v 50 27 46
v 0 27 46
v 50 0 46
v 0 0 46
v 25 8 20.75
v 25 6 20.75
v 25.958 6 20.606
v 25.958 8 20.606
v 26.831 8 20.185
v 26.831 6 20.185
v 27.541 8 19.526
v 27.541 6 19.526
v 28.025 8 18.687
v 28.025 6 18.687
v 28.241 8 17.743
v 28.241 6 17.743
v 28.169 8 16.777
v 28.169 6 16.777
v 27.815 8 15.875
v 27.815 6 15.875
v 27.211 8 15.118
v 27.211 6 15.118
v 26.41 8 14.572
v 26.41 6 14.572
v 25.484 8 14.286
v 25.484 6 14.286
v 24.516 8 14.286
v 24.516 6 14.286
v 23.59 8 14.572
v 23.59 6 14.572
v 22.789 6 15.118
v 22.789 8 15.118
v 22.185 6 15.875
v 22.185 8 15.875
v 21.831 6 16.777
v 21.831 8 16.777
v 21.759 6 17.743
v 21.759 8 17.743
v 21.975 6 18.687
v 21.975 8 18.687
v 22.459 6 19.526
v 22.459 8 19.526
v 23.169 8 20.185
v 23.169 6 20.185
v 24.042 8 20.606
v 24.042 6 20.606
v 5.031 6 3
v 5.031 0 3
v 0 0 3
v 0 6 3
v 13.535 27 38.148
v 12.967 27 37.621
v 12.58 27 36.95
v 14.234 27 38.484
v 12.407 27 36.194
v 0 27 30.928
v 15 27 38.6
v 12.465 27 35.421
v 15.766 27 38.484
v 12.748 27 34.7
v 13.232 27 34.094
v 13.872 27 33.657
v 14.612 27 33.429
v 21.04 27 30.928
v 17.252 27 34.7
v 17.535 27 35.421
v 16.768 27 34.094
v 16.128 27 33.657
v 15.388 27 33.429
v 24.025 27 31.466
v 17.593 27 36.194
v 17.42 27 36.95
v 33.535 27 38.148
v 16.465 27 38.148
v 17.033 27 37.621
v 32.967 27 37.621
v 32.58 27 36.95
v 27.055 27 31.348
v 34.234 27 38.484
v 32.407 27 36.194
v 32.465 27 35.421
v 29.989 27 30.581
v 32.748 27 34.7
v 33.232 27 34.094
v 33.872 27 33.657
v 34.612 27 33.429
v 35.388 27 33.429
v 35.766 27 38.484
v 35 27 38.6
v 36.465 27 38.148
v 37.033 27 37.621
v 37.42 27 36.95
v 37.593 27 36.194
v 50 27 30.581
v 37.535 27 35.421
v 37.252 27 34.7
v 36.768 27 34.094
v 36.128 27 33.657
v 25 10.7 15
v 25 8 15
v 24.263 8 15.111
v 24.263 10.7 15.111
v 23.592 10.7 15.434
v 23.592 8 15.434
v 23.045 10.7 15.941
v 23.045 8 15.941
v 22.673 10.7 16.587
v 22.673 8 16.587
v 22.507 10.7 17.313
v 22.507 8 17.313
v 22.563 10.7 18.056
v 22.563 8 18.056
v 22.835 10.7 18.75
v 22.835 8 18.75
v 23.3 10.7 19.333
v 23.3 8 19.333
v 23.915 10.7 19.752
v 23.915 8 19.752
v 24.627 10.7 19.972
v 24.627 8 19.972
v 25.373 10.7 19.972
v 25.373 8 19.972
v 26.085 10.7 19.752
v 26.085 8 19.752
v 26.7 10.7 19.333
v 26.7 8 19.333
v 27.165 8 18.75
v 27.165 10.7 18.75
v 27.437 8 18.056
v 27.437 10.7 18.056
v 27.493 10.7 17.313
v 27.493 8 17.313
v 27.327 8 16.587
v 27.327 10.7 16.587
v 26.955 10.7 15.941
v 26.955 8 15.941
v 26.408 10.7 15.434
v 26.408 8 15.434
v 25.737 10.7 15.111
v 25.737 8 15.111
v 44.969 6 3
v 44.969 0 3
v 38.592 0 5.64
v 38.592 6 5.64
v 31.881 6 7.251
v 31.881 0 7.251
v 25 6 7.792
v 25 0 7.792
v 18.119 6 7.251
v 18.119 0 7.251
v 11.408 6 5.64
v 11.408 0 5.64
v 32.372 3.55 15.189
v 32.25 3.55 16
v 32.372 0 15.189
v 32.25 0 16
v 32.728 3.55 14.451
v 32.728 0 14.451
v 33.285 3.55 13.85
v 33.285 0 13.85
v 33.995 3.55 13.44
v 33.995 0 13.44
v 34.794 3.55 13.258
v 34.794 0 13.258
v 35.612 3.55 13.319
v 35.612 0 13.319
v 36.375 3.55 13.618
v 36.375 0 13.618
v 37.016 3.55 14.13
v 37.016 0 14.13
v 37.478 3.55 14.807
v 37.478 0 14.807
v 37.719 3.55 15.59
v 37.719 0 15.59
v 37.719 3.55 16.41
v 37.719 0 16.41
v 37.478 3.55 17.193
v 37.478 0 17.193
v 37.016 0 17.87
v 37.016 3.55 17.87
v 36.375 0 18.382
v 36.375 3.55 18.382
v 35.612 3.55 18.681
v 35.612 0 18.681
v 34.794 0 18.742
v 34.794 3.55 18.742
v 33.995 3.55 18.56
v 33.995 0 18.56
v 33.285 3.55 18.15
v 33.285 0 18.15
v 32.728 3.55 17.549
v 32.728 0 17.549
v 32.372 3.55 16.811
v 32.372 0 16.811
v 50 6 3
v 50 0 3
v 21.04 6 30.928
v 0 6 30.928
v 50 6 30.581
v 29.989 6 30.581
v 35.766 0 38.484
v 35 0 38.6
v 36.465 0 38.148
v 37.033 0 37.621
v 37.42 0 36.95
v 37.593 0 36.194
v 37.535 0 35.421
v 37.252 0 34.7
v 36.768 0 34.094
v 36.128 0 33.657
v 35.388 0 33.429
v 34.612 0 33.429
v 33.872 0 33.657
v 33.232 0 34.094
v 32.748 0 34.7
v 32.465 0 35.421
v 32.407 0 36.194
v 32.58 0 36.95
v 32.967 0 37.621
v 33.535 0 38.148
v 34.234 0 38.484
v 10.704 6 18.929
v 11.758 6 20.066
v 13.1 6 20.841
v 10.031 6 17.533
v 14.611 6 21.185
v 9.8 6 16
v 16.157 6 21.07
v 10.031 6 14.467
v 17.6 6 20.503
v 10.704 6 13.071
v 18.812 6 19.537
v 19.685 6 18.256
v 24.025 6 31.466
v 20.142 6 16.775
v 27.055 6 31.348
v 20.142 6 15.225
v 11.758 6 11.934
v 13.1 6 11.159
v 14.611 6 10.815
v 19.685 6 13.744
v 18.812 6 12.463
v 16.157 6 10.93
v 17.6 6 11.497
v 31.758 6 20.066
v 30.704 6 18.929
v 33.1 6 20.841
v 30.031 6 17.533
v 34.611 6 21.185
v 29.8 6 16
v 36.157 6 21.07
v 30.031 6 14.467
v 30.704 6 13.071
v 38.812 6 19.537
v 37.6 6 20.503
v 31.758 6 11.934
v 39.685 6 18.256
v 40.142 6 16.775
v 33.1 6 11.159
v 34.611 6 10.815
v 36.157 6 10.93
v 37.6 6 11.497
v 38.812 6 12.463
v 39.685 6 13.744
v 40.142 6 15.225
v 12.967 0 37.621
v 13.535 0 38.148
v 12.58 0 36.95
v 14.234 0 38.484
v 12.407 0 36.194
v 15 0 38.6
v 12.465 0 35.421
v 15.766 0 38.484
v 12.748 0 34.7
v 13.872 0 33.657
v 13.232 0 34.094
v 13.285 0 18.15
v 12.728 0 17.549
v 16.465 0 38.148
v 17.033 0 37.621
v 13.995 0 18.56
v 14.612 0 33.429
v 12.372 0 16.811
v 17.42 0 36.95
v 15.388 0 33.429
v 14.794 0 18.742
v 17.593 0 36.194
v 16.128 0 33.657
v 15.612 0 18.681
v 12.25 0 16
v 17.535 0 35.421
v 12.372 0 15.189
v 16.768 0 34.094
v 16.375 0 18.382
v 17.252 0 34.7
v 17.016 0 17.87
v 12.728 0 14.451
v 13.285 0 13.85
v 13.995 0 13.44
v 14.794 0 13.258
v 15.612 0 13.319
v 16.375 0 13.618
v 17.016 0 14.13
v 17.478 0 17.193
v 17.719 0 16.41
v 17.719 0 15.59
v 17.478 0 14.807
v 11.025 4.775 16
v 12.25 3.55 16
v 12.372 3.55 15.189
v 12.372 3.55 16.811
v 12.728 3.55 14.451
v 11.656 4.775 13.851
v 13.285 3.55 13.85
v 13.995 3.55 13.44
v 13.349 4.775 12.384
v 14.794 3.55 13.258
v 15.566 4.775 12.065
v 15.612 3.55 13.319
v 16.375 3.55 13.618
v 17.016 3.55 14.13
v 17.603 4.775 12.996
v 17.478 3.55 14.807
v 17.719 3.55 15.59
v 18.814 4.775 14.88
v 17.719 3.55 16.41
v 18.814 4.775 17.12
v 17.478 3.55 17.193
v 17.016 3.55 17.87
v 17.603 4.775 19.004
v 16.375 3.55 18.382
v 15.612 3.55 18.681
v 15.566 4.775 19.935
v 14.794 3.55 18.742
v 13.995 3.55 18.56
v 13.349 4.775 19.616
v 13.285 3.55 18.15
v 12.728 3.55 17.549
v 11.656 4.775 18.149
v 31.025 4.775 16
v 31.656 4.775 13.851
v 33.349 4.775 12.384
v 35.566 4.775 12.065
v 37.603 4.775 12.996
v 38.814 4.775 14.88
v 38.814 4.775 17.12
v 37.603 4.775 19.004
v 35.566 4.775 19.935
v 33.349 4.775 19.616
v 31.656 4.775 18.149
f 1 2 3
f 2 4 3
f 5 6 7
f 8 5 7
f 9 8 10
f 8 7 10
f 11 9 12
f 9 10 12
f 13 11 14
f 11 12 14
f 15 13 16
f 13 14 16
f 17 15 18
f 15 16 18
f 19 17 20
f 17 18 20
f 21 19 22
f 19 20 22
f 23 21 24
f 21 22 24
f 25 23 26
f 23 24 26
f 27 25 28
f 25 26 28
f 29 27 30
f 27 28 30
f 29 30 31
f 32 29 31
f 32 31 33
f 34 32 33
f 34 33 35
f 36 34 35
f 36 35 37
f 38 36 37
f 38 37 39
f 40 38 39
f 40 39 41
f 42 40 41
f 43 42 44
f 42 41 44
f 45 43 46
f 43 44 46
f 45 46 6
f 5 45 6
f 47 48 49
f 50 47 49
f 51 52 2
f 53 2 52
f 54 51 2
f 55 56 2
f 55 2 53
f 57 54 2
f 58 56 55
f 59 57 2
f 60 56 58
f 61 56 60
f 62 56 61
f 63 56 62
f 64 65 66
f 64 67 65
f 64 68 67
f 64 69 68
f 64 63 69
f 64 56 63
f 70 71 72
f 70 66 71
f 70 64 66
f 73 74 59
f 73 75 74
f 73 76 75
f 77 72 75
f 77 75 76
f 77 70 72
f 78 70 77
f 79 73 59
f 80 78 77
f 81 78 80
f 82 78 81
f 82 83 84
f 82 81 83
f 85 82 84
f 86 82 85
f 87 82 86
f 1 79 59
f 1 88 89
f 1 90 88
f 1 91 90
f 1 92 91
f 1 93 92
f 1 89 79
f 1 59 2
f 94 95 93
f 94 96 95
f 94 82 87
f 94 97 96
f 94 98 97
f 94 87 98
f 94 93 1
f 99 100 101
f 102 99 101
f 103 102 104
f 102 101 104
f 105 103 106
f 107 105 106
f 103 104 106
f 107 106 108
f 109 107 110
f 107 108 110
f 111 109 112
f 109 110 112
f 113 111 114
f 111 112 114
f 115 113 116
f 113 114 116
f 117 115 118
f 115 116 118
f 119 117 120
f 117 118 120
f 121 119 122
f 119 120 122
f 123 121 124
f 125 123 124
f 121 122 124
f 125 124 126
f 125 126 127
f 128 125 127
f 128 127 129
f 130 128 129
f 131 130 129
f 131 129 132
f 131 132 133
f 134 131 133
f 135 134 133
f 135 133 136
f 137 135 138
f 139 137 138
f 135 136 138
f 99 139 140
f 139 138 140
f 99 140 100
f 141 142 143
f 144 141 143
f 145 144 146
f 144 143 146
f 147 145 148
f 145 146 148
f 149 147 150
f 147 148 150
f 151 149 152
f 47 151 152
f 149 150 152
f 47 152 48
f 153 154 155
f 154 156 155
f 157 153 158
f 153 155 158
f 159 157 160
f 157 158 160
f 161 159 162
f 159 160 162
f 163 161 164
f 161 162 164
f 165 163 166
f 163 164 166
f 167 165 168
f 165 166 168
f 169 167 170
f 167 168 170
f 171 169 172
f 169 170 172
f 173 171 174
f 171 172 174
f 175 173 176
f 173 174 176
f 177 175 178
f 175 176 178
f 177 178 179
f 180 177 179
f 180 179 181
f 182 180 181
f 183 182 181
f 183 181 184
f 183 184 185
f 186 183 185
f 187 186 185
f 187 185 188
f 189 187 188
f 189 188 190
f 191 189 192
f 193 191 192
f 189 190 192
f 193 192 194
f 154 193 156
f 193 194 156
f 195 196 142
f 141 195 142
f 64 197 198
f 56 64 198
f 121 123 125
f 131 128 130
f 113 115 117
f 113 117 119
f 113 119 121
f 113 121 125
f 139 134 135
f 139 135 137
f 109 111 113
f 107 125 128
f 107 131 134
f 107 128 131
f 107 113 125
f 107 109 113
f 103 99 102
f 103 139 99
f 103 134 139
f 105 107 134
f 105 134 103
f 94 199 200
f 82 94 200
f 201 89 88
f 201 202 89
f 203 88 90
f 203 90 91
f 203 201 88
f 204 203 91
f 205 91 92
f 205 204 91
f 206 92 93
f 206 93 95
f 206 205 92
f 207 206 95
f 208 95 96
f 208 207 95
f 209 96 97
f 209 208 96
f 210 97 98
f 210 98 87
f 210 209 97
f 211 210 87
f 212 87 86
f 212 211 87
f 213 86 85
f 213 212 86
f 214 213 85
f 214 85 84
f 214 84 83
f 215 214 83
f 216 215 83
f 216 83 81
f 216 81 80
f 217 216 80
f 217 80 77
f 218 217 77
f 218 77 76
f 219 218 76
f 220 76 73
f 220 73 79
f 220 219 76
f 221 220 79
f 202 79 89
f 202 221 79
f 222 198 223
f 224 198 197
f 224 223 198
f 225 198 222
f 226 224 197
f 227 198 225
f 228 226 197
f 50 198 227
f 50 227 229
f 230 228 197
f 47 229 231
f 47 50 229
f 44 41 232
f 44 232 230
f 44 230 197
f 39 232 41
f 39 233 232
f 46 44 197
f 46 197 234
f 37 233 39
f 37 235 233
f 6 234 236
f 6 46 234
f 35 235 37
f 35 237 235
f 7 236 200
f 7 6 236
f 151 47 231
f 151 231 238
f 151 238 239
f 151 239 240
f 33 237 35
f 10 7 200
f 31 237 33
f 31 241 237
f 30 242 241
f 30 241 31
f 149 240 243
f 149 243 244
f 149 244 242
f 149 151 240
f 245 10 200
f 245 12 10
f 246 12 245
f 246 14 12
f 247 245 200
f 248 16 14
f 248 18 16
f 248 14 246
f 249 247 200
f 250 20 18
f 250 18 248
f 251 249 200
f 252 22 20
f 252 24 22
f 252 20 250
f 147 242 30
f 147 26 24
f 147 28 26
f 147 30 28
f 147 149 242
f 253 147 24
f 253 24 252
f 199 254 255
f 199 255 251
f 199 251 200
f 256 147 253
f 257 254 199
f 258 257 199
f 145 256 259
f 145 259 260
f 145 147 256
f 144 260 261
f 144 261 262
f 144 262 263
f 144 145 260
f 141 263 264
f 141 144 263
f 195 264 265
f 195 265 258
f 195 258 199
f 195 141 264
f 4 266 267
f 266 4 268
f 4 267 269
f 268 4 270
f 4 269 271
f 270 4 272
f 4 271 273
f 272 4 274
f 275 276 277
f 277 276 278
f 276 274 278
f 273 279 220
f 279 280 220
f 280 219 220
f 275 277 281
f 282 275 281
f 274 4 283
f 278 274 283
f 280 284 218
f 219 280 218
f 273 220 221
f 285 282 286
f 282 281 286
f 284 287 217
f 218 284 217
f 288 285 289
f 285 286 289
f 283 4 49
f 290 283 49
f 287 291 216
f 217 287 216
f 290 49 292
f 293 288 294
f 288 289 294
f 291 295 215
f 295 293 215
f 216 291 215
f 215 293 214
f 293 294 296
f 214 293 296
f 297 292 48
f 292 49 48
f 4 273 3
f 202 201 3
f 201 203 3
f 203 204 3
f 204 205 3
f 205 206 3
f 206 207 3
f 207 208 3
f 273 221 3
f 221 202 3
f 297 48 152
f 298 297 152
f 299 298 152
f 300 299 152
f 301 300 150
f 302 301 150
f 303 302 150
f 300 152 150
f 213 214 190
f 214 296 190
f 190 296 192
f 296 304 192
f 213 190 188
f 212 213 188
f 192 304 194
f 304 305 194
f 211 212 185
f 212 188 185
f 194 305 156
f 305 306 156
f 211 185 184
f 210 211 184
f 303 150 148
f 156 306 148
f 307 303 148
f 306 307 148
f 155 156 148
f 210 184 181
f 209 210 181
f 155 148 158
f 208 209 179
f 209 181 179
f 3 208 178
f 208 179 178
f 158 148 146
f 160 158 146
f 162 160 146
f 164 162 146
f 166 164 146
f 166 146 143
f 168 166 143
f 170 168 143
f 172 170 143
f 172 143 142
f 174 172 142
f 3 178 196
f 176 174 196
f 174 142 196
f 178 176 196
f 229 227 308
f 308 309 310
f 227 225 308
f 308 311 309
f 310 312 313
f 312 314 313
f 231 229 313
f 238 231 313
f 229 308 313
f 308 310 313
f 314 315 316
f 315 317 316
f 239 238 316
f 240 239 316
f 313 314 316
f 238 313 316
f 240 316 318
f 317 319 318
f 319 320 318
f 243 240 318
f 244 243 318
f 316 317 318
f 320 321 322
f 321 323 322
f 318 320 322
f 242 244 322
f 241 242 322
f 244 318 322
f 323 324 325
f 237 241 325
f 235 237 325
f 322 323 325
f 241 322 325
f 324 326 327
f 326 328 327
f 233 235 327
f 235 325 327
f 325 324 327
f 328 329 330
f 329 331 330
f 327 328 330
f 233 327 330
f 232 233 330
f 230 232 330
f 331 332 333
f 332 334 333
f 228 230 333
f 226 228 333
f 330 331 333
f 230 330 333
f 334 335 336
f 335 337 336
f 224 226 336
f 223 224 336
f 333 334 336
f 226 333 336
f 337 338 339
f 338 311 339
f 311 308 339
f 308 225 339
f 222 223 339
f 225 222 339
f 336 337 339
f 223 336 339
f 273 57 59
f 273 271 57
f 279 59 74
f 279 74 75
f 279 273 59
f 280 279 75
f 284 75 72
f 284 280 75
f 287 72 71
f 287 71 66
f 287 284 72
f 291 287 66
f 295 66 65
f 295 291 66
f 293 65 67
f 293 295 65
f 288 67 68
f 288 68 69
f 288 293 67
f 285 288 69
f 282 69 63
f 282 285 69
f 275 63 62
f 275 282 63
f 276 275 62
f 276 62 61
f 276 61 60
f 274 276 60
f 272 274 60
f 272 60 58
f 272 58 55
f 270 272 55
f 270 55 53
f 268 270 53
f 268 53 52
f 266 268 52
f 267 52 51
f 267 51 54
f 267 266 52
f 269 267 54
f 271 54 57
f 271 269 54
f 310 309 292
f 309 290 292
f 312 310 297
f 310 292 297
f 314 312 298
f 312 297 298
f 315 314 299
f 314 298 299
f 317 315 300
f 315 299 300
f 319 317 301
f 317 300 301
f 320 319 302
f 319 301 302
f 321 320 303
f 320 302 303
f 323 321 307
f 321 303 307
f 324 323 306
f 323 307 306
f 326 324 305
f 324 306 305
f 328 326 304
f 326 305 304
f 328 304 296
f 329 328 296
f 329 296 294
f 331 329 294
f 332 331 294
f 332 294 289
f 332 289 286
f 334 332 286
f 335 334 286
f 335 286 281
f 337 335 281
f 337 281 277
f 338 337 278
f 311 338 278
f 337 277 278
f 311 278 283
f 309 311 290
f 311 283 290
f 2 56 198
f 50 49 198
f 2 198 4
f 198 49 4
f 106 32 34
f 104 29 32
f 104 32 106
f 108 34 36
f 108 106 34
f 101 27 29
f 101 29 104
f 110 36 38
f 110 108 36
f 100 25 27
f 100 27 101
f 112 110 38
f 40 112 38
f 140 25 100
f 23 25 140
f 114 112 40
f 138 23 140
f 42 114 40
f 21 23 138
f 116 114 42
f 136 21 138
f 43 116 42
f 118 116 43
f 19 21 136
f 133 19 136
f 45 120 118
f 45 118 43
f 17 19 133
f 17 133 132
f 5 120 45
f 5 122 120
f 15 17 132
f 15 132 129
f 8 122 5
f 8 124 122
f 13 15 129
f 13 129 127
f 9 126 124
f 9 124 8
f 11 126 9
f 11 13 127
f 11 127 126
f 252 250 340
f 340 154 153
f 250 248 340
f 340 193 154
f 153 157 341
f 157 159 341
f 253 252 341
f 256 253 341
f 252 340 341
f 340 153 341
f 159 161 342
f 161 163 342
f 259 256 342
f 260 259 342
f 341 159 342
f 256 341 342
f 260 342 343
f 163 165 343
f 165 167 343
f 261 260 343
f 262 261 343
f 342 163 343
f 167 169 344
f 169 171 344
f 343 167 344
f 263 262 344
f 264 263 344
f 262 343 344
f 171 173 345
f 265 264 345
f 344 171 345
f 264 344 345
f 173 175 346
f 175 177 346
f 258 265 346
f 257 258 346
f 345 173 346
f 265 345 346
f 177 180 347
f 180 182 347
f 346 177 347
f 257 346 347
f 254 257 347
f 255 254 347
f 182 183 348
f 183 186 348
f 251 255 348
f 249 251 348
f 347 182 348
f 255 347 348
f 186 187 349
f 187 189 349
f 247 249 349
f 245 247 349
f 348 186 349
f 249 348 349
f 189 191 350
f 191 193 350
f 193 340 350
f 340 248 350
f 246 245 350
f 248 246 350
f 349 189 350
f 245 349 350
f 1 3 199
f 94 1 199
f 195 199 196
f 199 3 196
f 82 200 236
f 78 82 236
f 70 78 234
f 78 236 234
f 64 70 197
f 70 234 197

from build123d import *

# Parameters (mm, degrees)
SKETCH1_R                                       = 2.6
BOSS_EXTRUDE1_DEPTH                             = 6
SKETCH2_R                                       = 3.25
BOSS_EXTRUDE2_DEPTH                             = 2
SKETCH3_R                                       = 2.5
BOSS_EXTRUDE3_DEPTH                             = 2.7
CSK_FOR_M5_FLAT_HEAD_MACHINE_SCREW1_D           = 5.5
CSK_FOR_M5_FLAT_HEAD_MACHINE_SCREW1_CSINK_D     = 10.4
CSK_FOR_M5_FLAT_HEAD_MACHINE_SCREW1_CSINK_ANGLE = 90
SKETCH7_R                                       = 2.6
BOSS_EXTRUDE5_DEPTH                             = 21


with BuildPart() as part:
    # Sketch1 → Boss-Extrude1 (new body)
    with BuildSketch(Plane(origin=(0, 0, 0), x_dir=(1, 0, 0), z_dir=(0, 1, 0))):
        with BuildLine():
            Line((5.031184409, -3), (0, -3))
            Line((0, -3), (0, -46))
            Line((0, -46), (50, -46))
            Line((50, -46), (50, -3))
            Line((50, -3), (44.968815591, -3))
            ThreePointArc((44.968815591, -3), (25, -7.79226602), (5.031184409, -3))
        make_face()
        with Locations(Location((15, -36, 0), (0, 0, 270))):
            Circle(SKETCH1_R, mode=Mode.SUBTRACT)
        with Locations(Location((35, -36, 0), (0, 0, 270))):
            Circle(SKETCH1_R, mode=Mode.SUBTRACT)
        with Locations(Location((15, -16, 0), (0, 0, 270))):
            Circle(SKETCH1_R, mode=Mode.SUBTRACT)
        with Locations(Location((35, -16, 0), (0, 0, 270))):
            Circle(SKETCH1_R, mode=Mode.SUBTRACT)
    extrude(amount=BOSS_EXTRUDE1_DEPTH)

    # Sketch2 → Boss-Extrude2 (add)
    with BuildSketch(Plane(origin=(0, 6, 0), x_dir=(1, 0, 0), z_dir=(0, 1, 0))):
        with Locations(Location((25, -17.5, 0), (0, 0, 270))):
            Circle(SKETCH2_R)
    extrude(amount=BOSS_EXTRUDE2_DEPTH)

    # Sketch3 → Boss-Extrude3 (add)
    with BuildSketch(Plane(origin=(0, 8, 0), x_dir=(1, 0, 0), z_dir=(0, 1, 0))):
        with Locations(Location((25, -17.5, 0), (0, 0, 90))):
            Circle(SKETCH3_R)
    extrude(amount=BOSS_EXTRUDE3_DEPTH)

    # CSK for M5 Flat Head Machine Screw1 (through all)
    with Locations(Plane(origin=(0, 6, 0), x_dir=(1, 0, 0), z_dir=(0, 1, 0))):
        with Locations((15, -16), (35, -16)):
            CounterSinkHole(CSK_FOR_M5_FLAT_HEAD_MACHINE_SCREW1_D / 2, CSK_FOR_M5_FLAT_HEAD_MACHINE_SCREW1_CSINK_D / 2, counter_sink_angle=CSK_FOR_M5_FLAT_HEAD_MACHINE_SCREW1_CSINK_ANGLE)

    # Sketch7 → Boss-Extrude5 (add)
    with BuildSketch(Plane(origin=(0, 6, 0), x_dir=(1, 0, 0), z_dir=(0, 1, 0))):
        with BuildLine():
            Line((21.039948447, -30.928253487), (0, -30.928253487))
            Line((0, -30.928253487), (0, -46))
            Line((0, -46), (50, -46))
            Line((50, -46), (50, -30.580877922))
            Line((50, -30.580877922), (29.989051292, -30.580877922))
            ThreePointArc((29.989051292, -30.580877922), (25.543026299, -31.489464694), (21.039948447, -30.928253487))
        make_face()
        with Locations(Location((15, -36, 0), (0, 0, 270))):
            Circle(SKETCH7_R, mode=Mode.SUBTRACT)
        with Locations(Location((35, -36, 0), (0, 0, 270))):
            Circle(SKETCH7_R, mode=Mode.SUBTRACT)
    extrude(amount=BOSS_EXTRUDE5_DEPTH)


solid = part.part
